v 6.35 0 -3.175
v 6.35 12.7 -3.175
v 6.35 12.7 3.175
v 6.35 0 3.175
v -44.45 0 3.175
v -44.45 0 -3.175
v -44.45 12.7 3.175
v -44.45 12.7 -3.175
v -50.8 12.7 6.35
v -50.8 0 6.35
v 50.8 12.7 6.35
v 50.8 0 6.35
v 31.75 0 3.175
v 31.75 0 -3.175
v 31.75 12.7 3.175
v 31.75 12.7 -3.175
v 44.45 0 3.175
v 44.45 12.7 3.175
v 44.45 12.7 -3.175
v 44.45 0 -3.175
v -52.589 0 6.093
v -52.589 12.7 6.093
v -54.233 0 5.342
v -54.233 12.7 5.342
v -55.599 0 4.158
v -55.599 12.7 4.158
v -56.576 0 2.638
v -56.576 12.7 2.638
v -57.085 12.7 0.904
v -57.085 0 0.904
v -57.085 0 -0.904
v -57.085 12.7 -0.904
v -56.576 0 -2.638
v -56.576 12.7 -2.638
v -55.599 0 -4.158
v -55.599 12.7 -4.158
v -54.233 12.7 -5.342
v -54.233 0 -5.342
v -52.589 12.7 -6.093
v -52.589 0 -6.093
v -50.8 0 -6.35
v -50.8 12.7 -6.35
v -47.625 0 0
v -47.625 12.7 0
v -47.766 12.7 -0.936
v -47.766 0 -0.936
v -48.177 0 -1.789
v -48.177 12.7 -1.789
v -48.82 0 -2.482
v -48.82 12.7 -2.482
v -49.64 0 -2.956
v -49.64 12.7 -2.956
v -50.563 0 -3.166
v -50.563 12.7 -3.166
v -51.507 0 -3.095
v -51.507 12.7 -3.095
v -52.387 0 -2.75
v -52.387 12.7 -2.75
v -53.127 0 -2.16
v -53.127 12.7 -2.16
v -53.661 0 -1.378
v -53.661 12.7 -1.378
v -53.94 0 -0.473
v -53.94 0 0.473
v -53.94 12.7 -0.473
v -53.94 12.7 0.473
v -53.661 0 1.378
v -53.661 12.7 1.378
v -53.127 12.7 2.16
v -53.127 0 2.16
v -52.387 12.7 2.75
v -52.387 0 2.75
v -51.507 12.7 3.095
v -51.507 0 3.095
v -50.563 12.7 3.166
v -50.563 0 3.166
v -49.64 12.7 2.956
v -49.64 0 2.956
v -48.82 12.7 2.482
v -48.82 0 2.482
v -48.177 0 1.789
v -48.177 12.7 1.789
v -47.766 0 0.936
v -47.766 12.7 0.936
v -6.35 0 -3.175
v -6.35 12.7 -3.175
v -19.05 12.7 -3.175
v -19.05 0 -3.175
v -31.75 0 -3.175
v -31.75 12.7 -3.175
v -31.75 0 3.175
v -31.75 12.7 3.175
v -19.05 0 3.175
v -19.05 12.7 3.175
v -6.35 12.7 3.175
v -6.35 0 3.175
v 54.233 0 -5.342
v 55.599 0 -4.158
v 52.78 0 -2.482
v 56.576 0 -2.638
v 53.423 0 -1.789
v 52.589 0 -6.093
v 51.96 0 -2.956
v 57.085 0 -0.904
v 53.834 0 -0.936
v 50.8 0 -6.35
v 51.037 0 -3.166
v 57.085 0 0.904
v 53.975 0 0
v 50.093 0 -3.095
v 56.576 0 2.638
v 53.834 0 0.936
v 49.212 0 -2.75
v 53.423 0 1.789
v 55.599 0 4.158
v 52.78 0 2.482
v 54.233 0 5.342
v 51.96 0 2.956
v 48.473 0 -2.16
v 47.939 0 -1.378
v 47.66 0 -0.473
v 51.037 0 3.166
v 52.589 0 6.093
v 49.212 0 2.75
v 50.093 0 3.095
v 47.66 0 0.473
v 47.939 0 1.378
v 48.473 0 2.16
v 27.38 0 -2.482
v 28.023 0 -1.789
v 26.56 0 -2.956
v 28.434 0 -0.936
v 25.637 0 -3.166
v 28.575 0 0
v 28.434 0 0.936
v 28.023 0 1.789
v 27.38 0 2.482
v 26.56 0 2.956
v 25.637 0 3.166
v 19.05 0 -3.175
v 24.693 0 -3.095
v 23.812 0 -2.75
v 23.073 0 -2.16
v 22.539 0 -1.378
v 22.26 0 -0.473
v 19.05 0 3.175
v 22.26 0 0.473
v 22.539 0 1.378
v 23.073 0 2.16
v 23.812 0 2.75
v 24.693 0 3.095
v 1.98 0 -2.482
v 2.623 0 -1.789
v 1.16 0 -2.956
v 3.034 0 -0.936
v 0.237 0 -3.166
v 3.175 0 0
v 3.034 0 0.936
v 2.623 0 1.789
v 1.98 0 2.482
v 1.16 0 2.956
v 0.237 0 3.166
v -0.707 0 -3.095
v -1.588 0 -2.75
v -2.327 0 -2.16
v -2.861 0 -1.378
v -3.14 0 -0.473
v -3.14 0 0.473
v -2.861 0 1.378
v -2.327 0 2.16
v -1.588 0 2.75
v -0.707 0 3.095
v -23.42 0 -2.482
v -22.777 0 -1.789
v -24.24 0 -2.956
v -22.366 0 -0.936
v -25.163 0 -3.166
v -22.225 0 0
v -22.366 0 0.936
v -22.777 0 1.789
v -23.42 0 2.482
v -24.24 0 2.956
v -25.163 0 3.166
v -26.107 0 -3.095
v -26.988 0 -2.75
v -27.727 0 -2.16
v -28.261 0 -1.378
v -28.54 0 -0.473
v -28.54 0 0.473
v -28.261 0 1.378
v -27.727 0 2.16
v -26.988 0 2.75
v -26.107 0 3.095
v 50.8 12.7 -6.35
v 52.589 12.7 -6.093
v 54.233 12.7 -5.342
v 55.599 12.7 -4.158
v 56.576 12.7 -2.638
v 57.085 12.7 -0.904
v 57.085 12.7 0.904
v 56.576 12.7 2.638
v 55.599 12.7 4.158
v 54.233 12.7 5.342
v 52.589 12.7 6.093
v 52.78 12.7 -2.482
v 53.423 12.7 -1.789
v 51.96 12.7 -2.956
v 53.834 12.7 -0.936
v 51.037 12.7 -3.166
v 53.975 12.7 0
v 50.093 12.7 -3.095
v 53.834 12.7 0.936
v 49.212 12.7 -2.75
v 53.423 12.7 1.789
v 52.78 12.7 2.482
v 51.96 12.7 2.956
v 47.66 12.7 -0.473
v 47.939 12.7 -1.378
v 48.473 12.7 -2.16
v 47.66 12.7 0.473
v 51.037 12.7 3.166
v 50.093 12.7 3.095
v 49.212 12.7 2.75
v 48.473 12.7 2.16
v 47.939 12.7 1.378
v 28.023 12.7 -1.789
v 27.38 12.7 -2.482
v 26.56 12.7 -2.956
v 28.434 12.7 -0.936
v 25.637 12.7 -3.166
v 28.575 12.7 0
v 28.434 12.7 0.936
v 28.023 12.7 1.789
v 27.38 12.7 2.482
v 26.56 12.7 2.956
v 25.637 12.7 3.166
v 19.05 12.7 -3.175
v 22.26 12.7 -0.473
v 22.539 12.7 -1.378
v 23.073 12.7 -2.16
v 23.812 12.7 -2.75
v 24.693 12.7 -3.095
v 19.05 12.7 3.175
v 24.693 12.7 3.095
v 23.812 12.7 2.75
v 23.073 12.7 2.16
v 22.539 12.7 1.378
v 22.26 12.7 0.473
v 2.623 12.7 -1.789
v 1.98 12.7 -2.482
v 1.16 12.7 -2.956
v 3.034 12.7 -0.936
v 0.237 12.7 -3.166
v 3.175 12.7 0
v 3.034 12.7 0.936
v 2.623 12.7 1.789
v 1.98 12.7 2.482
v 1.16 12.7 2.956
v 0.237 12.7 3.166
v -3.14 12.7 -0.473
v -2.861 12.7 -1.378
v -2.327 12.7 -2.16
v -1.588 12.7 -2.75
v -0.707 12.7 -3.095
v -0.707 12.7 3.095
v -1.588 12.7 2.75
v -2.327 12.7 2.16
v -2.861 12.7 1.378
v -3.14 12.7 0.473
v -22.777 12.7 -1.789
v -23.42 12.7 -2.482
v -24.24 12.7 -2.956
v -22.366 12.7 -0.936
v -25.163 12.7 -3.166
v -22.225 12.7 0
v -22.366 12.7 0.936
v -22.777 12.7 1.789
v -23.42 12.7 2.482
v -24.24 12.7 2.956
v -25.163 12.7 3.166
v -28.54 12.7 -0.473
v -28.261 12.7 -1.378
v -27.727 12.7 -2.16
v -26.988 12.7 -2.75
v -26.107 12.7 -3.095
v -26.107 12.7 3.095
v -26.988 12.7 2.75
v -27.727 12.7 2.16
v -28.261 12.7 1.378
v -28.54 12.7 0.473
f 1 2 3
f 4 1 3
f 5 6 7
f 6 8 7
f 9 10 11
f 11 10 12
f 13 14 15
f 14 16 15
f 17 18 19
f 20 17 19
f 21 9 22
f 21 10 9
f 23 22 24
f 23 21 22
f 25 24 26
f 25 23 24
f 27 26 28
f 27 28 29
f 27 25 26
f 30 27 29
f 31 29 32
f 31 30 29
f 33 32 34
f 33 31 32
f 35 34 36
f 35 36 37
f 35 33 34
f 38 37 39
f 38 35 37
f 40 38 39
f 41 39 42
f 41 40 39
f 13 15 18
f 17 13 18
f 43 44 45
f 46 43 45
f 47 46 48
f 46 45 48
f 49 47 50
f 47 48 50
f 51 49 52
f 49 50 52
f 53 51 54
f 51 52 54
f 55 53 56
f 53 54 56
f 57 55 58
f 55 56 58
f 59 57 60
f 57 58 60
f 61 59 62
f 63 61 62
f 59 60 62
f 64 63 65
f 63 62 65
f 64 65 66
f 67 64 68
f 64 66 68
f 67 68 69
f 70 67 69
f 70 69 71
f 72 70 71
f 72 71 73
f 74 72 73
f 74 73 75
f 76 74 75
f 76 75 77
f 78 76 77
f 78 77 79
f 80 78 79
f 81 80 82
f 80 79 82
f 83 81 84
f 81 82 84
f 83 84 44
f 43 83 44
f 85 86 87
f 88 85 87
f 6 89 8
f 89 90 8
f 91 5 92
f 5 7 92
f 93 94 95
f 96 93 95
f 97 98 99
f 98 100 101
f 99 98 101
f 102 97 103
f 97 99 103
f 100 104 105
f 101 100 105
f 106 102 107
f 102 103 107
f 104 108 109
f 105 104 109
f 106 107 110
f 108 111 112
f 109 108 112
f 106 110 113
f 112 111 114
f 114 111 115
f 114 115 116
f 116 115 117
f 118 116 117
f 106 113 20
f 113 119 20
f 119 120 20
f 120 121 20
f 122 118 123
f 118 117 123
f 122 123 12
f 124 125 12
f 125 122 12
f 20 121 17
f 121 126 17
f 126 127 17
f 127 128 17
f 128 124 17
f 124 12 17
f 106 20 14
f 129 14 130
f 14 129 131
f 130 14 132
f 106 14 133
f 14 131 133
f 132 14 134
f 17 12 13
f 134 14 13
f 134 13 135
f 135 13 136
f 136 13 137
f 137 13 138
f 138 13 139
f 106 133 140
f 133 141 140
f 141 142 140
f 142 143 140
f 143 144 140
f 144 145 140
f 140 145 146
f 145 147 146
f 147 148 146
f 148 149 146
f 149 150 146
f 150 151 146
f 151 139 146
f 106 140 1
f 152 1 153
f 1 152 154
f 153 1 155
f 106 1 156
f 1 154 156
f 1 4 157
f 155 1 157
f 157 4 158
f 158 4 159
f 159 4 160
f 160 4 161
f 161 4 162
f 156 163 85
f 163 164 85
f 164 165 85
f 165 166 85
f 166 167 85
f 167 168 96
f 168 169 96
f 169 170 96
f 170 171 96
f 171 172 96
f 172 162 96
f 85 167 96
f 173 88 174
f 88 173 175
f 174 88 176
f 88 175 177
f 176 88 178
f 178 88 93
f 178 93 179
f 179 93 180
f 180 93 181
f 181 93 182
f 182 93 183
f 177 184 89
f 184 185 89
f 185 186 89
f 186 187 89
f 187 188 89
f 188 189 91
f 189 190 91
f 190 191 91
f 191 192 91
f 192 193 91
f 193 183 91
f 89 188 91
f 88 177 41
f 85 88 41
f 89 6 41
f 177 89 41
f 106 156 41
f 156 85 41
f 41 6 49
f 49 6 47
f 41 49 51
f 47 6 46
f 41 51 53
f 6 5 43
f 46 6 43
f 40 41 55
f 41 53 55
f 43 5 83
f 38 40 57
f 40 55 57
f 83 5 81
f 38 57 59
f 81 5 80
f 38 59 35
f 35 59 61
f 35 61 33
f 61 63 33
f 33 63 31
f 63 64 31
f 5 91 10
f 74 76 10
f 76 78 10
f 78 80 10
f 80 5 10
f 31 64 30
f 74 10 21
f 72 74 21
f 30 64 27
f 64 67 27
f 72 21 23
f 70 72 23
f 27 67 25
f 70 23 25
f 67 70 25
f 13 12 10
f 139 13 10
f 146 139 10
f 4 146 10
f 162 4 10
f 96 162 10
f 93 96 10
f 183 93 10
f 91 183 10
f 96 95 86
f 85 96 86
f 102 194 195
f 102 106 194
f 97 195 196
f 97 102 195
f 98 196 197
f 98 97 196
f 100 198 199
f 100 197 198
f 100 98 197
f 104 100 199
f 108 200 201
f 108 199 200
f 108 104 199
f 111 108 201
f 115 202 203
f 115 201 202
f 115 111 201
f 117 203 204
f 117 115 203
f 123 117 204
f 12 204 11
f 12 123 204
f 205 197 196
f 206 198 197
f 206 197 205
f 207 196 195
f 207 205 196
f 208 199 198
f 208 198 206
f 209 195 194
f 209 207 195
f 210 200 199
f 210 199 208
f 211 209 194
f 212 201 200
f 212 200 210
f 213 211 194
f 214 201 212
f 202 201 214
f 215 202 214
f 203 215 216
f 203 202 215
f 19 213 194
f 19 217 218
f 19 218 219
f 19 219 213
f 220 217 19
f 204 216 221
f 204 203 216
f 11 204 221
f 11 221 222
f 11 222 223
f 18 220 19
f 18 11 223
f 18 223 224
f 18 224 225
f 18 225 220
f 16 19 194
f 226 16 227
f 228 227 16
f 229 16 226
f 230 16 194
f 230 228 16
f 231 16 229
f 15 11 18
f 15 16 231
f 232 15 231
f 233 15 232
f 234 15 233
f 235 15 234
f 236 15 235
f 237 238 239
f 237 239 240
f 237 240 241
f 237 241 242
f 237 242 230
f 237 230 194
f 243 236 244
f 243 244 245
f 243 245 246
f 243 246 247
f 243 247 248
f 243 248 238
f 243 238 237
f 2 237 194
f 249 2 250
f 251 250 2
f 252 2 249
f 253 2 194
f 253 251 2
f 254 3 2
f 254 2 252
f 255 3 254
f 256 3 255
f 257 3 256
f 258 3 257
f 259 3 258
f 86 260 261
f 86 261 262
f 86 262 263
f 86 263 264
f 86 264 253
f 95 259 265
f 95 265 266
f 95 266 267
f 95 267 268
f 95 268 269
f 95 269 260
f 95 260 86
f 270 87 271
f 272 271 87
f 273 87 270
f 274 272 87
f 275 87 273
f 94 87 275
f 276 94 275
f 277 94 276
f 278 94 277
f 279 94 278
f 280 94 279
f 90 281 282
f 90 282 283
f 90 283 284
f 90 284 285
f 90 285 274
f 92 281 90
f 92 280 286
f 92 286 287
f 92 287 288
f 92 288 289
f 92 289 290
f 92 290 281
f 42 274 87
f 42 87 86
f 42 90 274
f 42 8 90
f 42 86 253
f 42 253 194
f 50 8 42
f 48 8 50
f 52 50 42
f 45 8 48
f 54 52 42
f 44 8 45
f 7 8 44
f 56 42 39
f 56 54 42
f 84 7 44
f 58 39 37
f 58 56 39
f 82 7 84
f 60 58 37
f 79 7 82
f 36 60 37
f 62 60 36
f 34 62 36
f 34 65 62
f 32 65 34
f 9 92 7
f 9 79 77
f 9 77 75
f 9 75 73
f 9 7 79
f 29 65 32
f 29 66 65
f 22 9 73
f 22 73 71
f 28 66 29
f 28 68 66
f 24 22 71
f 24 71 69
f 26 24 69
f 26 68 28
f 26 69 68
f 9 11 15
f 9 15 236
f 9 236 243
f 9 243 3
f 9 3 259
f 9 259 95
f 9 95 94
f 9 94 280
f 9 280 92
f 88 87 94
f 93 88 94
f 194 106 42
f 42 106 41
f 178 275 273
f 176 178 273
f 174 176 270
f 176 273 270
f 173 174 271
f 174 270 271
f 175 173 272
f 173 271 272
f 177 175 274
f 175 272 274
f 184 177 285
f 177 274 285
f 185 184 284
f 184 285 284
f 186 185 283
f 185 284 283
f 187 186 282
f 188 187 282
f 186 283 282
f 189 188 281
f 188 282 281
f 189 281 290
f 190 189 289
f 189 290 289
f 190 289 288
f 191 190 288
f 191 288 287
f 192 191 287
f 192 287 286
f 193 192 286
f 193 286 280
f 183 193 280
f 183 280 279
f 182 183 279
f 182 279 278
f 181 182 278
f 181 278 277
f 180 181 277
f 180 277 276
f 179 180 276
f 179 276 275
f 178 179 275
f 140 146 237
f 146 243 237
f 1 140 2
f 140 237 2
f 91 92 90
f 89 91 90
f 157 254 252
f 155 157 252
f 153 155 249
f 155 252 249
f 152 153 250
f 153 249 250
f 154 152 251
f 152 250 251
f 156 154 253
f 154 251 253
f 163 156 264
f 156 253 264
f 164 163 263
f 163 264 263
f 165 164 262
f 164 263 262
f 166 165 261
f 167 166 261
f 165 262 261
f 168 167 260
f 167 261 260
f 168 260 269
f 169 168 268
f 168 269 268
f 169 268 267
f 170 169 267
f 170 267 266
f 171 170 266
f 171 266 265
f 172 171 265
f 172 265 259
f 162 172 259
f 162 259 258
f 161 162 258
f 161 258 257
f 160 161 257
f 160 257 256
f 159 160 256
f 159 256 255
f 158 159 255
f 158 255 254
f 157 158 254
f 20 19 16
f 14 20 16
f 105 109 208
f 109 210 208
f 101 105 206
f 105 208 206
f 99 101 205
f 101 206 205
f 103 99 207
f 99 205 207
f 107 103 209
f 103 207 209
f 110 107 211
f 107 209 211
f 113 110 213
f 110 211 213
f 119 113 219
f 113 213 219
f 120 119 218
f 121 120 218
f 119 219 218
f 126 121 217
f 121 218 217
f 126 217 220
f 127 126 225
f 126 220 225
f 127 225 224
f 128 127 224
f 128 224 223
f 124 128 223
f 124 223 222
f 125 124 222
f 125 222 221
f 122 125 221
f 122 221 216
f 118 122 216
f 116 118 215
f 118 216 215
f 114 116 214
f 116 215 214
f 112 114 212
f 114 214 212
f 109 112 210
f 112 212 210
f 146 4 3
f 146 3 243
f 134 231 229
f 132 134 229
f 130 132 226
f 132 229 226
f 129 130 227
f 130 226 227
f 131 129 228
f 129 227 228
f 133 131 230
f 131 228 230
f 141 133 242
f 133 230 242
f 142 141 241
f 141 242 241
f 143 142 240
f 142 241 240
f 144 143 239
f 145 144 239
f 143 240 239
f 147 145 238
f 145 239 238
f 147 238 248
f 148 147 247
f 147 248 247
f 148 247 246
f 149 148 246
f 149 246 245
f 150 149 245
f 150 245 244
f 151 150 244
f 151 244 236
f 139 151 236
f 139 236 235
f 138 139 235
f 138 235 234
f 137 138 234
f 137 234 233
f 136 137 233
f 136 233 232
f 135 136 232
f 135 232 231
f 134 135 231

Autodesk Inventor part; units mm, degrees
ref_plane "YZ Plane" through (0, 0, 0) normal (1, 0, 0) x (0, 1, 0)
ref_plane "XZ Plane" through (0, 0, 0) normal (0, 1, 0) x (-1, 0, 0)
ref_plane "XY Plane" through (0, 0, 0) normal (0, 0, 1) x (1, 0, 0)
sketch "Sketch1" plane through (0, 0, 0) normal (0, 1, 0) x (-1, 0, 0)
  line L0 (50.8, 6.35) -> (-50.8, 6.35)
  line L1 (-50.8, -6.35) -> (50.8, -6.35)
  arc A0 (50.8, -6.35) -> (50.8, 6.35) centre (50.8, 0) ccw
  arc A1 (-50.8, 6.35) -> (-50.8, -6.35) centre (-50.8, 0) ccw
  line L2 (80.01, 0) -> (-80.01, 0) projected
  line L3 (0, -8.89) -> (0, 8.89) projected
  point P0 (0, 0)
  dimension "d2" = 101.6
  dimension "d3" = 6.35
  dimension "d4" = 6.35
  dimension "d5" = 50.8
  dimension "d6" = 0
  dimension "d7" = 12.7
  dimension "d8" = 101.6
  dimension "d9" = 6.35
extrude "Extrusion1" add sketch "Sketch1" along normal blind 12.7
sketch "Sketch2" plane through (0, 12.7, 0) normal (0, 1, 0) x (1, 0, 0)
  circle A0 centre (-50.8, 0) radius 3.175
  line L0 (-80.01, 0) -> (80.01, 0) projected
  line L1 (0, 8.89) -> (0, -8.89) projected
  circle A1 centre (-25.4, 0) radius 3.175
  circle A2 centre (0, 0) radius 3.175
  circle A3 centre (25.4, 0) radius 3.175
  circle A4 centre (50.8, 0) radius 3.175
  dimension "d12" = 6.35
  dimension "d13" = 50.8
  dimension "d14" = 0
  dimension "d17" = 25.4
extrude "Extrusion2" cut sketch "Sketch2" against normal through all
sketch "Sketch3" plane through (0, 12.7, 0) normal (0, 1, 0) x (1, 0, 0)
  line L0 (-44.45, -3.175) -> (-31.75, -3.175)
  line L1 (-31.75, -3.175) -> (-31.75, 3.175)
  line L2 (-31.75, 3.175) -> (-44.45, 3.175)
  line L3 (-44.45, 3.175) -> (-44.45, -3.175)
  line L4 (-84.8983, 0) -> (80.8247, 0) projected
  line L5 (0, 12.3762) -> (0, -29.8073) projected
  line L6 (-6.35, 3.175) -> (-19.05, 3.175)
  line L7 (-6.35, -3.175) -> (-6.35, 3.175)
  line L8 (-19.05, 3.175) -> (-19.05, -3.175)
  line L9 (-19.05, -3.175) -> (-6.35, -3.175)
  line L10 (19.05, 3.175) -> (6.35, 3.175)
  line L11 (19.05, -3.175) -> (19.05, 3.175)
  line L12 (6.35, 3.175) -> (6.35, -3.175)
  line L13 (6.35, -3.175) -> (19.05, -3.175)
  line L14 (44.45, 3.175) -> (31.75, 3.175)
  line L15 (44.45, -3.175) -> (44.45, 3.175)
  line L16 (31.75, 3.175) -> (31.75, -3.175)
  line L17 (31.75, -3.175) -> (44.45, -3.175)
  point P0 (0, 0)
  dimension "d24" = 12.7
  dimension "d25" = 6.35
  dimension "d26" = 31.75
  dimension "d27" = 3.175
  dimension "d30" = 25.4
extrude "Extrusion3" cut sketch "Sketch3" against normal through all
properties part number "4M Module" material "Wood (Oak)"
